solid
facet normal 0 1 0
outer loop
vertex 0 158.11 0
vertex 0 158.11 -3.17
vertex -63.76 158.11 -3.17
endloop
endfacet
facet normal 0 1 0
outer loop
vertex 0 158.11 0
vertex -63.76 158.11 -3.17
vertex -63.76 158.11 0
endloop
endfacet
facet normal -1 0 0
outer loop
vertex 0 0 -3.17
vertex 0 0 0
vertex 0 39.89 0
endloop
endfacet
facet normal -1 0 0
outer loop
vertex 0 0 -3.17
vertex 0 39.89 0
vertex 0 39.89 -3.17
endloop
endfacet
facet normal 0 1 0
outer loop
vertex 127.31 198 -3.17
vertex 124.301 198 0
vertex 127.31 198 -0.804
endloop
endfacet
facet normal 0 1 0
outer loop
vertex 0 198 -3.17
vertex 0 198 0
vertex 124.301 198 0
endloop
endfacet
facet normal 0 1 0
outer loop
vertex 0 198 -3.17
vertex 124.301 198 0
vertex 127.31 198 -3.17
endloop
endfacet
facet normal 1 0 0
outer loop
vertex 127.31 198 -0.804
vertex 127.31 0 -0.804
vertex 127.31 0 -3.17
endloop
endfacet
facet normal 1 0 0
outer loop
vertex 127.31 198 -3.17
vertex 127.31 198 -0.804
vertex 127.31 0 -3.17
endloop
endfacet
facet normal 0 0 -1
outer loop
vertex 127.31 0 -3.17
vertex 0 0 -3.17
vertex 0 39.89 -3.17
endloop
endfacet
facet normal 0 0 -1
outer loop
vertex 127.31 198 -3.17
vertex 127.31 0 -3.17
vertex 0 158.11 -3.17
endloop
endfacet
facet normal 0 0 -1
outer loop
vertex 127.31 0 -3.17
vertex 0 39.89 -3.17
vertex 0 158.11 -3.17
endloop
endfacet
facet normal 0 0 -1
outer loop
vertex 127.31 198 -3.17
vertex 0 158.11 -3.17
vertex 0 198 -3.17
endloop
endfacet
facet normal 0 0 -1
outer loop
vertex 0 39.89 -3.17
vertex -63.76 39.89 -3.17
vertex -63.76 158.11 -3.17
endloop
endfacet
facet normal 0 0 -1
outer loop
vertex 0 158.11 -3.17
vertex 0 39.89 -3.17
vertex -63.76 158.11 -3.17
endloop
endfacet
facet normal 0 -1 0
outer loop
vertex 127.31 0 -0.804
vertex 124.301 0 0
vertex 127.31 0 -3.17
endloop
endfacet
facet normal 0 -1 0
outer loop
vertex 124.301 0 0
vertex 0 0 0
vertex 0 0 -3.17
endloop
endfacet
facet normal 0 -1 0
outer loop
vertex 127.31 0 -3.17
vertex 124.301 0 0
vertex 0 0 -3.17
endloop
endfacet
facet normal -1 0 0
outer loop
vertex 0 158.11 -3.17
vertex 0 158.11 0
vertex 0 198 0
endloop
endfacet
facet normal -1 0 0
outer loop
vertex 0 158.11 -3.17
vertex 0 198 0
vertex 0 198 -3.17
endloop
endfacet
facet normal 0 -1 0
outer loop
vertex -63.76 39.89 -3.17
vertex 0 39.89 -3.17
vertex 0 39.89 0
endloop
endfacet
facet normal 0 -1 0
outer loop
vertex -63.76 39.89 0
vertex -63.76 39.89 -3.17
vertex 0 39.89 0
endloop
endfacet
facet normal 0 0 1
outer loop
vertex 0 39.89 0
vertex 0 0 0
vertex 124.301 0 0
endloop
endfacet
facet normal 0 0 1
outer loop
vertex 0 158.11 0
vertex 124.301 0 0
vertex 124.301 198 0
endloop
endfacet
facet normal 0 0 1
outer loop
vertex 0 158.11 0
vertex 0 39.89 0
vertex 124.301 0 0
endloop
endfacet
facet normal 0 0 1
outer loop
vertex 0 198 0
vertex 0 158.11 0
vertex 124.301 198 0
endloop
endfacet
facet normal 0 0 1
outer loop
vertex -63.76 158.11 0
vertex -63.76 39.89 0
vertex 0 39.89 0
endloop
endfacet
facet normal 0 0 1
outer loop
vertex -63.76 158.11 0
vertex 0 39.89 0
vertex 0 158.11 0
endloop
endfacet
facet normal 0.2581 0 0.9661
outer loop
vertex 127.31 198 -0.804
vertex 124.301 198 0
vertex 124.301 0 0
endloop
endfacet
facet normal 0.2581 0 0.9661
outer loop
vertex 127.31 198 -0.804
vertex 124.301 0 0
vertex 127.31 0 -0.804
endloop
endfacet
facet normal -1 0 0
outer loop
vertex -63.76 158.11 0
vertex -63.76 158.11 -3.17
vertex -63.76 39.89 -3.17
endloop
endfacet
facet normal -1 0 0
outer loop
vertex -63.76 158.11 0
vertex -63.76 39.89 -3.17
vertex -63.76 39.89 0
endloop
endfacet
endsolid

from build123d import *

# Parameters (mm, degrees)
SKETCH1_W           = 79.31
SKETCH1_H           = 3.17
BOSS_EXTRUDE1_DEPTH = 198
SKETCH2_W           = 3.17
SKETCH2_H           = 118.22
BOSS_EXTRUDE2_DEPTH = 63.76
SKETCH3_W           = 3.17
SKETCH3_H           = 198
BOSS_EXTRUDE3_DEPTH = 48
CUT_EXTRUDE1_DEPTH  = 200


with BuildPart() as part:
    # Sketch1 → Boss-Extrude1 (new body)
    with BuildSketch(Plane(origin=(0, 0, 0), x_dir=(1, 0, 0), z_dir=(0, 1, 0))):
        with Locations((39.655, 1.585)):
            Rectangle(SKETCH1_W, SKETCH1_H)
    extrude(amount=BOSS_EXTRUDE1_DEPTH)

    # Sketch2 → Boss-Extrude2 (add)
    with BuildSketch(Plane.ZY):
        with Locations((-1.585, 99)):
            Rectangle(SKETCH2_W, SKETCH2_H)
    extrude(amount=BOSS_EXTRUDE2_DEPTH)

    # Sketch3 → Boss-Extrude3 (add)
    with BuildSketch(Plane(origin=(79.31, 0, 0), x_dir=(0, 0, -1), z_dir=(1, 0, 0))):
        with Locations((1.585, 99)):
            Rectangle(SKETCH3_W, SKETCH3_H)
    extrude(amount=BOSS_EXTRUDE3_DEPTH)

    # Sketch5 → Cut-Extrude1 (cut)
    with BuildSketch(Plane(origin=(0, 198, 0), x_dir=(1, 0, 0), z_dir=(0, 1, 0))):
        Polygon((124.301364544, 0), (127.332496868, 0.810264437), (127.332496868, 0), align=None)
    extrude(amount=-CUT_EXTRUDE1_DEPTH, mode=Mode.SUBTRACT)


solid = part.part
